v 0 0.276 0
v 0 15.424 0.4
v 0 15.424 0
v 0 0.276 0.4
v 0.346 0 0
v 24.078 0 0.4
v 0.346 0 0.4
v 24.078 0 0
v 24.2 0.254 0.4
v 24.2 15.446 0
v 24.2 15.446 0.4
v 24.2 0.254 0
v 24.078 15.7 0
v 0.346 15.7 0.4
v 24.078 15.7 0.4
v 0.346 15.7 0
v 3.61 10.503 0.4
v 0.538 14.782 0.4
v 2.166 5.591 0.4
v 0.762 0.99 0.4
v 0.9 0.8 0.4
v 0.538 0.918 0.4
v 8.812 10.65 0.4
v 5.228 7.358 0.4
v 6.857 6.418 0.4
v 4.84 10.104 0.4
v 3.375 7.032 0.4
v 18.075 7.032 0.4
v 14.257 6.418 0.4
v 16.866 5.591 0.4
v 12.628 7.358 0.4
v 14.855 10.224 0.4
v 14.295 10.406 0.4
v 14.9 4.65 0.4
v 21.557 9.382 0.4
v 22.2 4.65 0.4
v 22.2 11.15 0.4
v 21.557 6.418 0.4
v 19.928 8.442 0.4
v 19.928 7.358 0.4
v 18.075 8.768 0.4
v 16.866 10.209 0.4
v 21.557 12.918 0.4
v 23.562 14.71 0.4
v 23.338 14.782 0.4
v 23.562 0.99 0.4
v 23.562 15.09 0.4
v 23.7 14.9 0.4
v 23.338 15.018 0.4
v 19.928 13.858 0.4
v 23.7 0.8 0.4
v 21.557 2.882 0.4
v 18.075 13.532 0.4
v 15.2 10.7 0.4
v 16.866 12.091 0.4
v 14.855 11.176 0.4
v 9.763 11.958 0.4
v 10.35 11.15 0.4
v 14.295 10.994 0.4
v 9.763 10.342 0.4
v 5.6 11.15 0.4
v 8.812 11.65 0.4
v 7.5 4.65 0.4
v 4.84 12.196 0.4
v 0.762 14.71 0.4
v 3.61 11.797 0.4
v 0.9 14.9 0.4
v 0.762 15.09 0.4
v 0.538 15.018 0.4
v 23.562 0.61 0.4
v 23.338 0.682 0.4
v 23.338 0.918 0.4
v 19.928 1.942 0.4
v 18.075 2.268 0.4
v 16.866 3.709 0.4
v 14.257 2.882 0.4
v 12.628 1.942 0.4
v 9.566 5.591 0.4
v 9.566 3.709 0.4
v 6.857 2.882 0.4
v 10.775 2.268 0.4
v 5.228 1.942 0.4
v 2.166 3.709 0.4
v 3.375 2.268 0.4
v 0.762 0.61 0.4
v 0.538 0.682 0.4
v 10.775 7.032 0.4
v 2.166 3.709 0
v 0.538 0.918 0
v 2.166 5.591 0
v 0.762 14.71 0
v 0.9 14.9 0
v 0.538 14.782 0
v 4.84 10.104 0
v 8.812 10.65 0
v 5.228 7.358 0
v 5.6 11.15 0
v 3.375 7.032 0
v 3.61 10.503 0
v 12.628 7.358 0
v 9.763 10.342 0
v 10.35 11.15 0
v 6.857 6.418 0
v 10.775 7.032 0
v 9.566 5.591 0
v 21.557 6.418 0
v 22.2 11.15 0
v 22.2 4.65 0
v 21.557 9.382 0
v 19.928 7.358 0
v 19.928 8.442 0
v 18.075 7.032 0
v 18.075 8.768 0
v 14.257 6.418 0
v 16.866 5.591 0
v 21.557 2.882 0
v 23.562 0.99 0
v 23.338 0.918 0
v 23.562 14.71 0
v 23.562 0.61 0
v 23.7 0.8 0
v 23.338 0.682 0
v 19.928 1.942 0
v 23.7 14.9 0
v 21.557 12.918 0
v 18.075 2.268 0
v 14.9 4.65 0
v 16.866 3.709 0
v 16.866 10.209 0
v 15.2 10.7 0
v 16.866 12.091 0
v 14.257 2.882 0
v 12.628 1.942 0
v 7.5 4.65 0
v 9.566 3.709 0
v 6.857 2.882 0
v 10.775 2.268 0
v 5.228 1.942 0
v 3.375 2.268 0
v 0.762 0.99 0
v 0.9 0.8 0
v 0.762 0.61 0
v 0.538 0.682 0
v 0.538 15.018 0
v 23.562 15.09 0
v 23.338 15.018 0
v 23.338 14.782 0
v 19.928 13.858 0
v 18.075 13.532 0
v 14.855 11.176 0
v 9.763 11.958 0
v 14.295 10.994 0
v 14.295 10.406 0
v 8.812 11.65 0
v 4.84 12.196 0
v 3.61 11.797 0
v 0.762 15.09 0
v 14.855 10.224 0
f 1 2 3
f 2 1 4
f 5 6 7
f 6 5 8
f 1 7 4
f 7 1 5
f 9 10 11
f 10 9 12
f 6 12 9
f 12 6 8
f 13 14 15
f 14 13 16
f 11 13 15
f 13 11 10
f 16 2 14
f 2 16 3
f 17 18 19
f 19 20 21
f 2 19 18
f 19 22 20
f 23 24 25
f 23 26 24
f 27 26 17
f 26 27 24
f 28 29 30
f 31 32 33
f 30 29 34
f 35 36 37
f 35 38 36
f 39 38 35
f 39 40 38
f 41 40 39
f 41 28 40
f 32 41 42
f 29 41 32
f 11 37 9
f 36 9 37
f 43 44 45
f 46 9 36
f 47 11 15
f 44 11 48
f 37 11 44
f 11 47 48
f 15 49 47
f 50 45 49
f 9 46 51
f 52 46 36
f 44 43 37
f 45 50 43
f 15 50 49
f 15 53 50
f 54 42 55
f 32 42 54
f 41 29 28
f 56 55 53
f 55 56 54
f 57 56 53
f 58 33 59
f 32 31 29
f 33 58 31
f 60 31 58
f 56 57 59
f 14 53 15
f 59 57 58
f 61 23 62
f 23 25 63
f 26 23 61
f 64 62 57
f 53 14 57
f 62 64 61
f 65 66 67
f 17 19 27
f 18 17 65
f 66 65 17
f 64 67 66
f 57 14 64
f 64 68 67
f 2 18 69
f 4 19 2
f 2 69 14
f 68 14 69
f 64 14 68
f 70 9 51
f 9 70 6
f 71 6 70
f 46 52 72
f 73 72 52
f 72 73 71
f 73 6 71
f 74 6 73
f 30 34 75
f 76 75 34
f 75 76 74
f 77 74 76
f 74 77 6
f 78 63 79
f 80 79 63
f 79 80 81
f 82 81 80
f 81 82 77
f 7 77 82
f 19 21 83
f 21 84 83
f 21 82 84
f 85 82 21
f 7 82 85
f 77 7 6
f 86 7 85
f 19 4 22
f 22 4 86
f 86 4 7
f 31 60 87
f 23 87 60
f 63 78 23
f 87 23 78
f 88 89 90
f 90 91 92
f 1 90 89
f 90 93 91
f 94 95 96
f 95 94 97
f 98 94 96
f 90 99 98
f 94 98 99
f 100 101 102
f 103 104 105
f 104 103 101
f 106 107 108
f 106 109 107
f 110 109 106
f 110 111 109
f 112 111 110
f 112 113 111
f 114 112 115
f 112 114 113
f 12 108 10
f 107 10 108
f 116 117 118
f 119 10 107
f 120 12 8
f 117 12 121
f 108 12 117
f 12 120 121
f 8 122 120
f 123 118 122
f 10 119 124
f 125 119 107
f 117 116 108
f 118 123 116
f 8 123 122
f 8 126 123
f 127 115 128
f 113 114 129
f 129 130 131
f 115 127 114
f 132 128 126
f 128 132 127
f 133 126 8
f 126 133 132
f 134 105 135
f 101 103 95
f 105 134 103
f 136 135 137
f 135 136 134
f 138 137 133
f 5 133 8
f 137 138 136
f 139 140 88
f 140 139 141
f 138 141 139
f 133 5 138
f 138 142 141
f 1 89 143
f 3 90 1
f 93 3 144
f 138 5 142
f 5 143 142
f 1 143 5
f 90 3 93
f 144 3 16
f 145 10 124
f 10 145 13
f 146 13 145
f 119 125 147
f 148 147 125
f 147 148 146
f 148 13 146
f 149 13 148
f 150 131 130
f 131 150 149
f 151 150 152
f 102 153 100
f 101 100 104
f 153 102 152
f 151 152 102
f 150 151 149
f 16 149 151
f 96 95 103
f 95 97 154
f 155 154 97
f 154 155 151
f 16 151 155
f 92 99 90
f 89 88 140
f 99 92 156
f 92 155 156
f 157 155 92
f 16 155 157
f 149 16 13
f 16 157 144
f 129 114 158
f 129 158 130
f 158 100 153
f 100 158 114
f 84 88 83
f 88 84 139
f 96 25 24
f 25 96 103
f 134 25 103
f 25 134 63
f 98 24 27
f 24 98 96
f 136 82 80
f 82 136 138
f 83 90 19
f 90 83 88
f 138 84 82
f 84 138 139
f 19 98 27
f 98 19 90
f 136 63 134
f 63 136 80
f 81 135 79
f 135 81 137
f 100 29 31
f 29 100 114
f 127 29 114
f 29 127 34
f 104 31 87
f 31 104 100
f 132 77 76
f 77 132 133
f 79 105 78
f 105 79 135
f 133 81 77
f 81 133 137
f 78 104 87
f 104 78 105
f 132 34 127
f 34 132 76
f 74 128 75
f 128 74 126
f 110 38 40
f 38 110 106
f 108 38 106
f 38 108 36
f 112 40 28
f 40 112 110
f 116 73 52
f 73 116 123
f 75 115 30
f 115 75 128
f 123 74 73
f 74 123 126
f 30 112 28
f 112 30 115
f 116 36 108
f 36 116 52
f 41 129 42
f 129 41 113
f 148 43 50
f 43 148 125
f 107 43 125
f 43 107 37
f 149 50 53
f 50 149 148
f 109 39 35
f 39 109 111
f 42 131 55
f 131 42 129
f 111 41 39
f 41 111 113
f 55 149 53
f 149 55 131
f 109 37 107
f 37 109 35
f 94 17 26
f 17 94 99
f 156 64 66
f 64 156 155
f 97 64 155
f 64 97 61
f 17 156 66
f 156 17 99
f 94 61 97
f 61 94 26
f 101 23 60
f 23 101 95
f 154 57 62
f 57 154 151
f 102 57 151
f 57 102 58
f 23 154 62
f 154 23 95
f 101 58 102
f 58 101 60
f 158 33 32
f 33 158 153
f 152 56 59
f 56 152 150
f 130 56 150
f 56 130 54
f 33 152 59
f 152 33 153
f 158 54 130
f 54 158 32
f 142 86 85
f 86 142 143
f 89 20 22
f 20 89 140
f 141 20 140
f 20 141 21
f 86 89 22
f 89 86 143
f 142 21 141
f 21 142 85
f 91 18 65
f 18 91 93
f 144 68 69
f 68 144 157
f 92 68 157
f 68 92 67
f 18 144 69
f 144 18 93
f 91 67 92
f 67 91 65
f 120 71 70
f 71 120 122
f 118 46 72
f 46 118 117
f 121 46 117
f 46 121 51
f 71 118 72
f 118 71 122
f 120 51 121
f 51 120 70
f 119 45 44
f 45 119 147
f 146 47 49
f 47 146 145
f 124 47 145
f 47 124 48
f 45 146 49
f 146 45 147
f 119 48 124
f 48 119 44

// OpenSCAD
difference() {
cube([24.2, 15.7, 0.4]);
translate([4.75, 4.65, -1])
cylinder(h = 5, r1 = 2.75, r2 = 2.75);
translate([12.15, 4.65, -1])
cylinder(h = 5, r1 = 2.75, r2 = 2.75);
translate([19.45, 4.65, -1])
cylinder(h = 5, r1 = 2.75, r2 = 2.75);
translate([19.45, 11.15, -1])
cylinder(h = 5, r1 = 2.75, r2 = 2.75);

translate([4.5, 11.15, -1])
cylinder(h = 5, r1 = 1.1, r2 = 1.1);
translate([9.5, 11.15, -1])
cylinder(h = 5, r1 = 0.85, r2 = 0.85);
translate([14.7, 10.7, -1])
cylinder(h = 5, r1 = 0.5, r2 = 0.5);

translate([0.7, 0.8, -1])
cylinder(h = 5, r1 = 0.2, r2 = 0.2);
translate([0.7, 14.9, -1])
cylinder(h = 5, r1 = 0.2, r2 = 0.2);
translate([23.5, 0.8, -1])
cylinder(h = 5, r1 = 0.2, r2 = 0.2);
translate([23.5, 14.9, -1])
cylinder(h = 5, r1 = 0.2, r2 = 0.2);
difference() {
	translate([0, 0, -2])
	cube([1, 1, 4]);
	translate([1.5, 1.5, -2])
	cylinder(h = 15, r1 = 2.1, r2 = 2.1);
	}
difference() {
	translate([23.2, 0, -2])
	cube([1, 1, 4]);
	translate([22.7, 1.5, -2])
	cylinder(h = 15, r1 = 2.1, r2 = 2.1);
	}
difference() {
	translate([23.2, 14.7, -2])
	cube([1, 1, 4]);
	translate([22.7, 14.2, -2])
	cylinder(h = 15, r1 = 2.1, r2 = 2.1);
	}
difference() {
	translate([0, 14.7, -2])
	cube([1, 1, 4]);
	translate([1.5, 14.2, -2])
	cylinder(h = 15, r1 = 2.1, r2 = 2.1);
	}
}
